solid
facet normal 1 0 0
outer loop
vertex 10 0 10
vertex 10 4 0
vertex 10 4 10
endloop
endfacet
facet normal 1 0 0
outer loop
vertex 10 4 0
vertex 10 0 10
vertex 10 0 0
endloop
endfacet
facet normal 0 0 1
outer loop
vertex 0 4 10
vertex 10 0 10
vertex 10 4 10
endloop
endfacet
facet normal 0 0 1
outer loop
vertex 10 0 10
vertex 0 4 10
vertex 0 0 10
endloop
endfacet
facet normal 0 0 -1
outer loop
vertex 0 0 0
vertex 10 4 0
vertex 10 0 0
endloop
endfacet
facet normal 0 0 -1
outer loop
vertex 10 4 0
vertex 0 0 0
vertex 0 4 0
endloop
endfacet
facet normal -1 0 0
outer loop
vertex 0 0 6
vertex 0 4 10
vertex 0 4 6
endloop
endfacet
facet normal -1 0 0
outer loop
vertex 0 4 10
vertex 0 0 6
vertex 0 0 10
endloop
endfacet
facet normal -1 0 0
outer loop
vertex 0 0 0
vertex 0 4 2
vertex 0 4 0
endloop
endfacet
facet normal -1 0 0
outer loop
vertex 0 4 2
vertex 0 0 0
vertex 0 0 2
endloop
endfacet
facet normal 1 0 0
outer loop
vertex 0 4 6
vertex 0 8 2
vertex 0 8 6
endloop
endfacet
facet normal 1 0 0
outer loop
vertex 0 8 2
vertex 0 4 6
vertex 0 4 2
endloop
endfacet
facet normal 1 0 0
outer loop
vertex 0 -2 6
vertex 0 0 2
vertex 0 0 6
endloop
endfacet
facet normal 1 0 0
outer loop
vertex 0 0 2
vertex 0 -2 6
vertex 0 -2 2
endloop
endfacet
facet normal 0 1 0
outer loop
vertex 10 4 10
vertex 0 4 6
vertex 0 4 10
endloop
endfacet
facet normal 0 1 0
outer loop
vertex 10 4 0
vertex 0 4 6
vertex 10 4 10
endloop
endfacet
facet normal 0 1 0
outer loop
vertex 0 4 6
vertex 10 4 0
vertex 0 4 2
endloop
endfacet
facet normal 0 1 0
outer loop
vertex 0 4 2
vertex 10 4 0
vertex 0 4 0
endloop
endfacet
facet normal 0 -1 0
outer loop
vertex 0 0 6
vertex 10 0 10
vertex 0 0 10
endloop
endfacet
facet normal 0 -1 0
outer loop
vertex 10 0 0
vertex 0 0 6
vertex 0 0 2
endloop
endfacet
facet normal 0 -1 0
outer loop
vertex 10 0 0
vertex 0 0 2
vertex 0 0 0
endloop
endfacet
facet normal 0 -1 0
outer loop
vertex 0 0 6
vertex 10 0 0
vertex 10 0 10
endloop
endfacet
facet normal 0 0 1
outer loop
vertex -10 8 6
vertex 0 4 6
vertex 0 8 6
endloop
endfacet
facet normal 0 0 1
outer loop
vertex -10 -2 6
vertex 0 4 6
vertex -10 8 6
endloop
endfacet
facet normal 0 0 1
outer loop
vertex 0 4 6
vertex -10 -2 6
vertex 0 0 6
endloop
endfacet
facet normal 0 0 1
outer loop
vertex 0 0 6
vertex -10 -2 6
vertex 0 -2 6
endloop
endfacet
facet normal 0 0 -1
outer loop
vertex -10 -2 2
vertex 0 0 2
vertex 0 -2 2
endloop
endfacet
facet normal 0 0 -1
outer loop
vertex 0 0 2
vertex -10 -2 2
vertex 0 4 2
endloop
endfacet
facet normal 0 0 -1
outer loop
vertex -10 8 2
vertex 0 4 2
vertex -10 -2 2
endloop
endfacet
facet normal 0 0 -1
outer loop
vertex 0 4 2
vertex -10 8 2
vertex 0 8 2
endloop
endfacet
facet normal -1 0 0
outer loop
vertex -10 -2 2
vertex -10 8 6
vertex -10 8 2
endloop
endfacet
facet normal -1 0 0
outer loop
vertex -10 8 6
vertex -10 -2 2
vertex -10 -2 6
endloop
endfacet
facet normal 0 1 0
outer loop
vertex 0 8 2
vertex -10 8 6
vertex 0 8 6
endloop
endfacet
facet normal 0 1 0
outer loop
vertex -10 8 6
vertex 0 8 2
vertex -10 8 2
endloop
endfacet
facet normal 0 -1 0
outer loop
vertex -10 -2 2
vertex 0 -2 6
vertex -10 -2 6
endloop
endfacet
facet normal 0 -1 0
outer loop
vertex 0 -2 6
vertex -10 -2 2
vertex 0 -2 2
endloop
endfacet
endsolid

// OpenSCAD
//for (t=[[0,0,0],[5,0,0],[10,1,0],[15,1,2]]) translate(t) cube([5,5,5]);
cube([10,4,10]);
translate([-10,-2,2])cube([10,10,4]);
